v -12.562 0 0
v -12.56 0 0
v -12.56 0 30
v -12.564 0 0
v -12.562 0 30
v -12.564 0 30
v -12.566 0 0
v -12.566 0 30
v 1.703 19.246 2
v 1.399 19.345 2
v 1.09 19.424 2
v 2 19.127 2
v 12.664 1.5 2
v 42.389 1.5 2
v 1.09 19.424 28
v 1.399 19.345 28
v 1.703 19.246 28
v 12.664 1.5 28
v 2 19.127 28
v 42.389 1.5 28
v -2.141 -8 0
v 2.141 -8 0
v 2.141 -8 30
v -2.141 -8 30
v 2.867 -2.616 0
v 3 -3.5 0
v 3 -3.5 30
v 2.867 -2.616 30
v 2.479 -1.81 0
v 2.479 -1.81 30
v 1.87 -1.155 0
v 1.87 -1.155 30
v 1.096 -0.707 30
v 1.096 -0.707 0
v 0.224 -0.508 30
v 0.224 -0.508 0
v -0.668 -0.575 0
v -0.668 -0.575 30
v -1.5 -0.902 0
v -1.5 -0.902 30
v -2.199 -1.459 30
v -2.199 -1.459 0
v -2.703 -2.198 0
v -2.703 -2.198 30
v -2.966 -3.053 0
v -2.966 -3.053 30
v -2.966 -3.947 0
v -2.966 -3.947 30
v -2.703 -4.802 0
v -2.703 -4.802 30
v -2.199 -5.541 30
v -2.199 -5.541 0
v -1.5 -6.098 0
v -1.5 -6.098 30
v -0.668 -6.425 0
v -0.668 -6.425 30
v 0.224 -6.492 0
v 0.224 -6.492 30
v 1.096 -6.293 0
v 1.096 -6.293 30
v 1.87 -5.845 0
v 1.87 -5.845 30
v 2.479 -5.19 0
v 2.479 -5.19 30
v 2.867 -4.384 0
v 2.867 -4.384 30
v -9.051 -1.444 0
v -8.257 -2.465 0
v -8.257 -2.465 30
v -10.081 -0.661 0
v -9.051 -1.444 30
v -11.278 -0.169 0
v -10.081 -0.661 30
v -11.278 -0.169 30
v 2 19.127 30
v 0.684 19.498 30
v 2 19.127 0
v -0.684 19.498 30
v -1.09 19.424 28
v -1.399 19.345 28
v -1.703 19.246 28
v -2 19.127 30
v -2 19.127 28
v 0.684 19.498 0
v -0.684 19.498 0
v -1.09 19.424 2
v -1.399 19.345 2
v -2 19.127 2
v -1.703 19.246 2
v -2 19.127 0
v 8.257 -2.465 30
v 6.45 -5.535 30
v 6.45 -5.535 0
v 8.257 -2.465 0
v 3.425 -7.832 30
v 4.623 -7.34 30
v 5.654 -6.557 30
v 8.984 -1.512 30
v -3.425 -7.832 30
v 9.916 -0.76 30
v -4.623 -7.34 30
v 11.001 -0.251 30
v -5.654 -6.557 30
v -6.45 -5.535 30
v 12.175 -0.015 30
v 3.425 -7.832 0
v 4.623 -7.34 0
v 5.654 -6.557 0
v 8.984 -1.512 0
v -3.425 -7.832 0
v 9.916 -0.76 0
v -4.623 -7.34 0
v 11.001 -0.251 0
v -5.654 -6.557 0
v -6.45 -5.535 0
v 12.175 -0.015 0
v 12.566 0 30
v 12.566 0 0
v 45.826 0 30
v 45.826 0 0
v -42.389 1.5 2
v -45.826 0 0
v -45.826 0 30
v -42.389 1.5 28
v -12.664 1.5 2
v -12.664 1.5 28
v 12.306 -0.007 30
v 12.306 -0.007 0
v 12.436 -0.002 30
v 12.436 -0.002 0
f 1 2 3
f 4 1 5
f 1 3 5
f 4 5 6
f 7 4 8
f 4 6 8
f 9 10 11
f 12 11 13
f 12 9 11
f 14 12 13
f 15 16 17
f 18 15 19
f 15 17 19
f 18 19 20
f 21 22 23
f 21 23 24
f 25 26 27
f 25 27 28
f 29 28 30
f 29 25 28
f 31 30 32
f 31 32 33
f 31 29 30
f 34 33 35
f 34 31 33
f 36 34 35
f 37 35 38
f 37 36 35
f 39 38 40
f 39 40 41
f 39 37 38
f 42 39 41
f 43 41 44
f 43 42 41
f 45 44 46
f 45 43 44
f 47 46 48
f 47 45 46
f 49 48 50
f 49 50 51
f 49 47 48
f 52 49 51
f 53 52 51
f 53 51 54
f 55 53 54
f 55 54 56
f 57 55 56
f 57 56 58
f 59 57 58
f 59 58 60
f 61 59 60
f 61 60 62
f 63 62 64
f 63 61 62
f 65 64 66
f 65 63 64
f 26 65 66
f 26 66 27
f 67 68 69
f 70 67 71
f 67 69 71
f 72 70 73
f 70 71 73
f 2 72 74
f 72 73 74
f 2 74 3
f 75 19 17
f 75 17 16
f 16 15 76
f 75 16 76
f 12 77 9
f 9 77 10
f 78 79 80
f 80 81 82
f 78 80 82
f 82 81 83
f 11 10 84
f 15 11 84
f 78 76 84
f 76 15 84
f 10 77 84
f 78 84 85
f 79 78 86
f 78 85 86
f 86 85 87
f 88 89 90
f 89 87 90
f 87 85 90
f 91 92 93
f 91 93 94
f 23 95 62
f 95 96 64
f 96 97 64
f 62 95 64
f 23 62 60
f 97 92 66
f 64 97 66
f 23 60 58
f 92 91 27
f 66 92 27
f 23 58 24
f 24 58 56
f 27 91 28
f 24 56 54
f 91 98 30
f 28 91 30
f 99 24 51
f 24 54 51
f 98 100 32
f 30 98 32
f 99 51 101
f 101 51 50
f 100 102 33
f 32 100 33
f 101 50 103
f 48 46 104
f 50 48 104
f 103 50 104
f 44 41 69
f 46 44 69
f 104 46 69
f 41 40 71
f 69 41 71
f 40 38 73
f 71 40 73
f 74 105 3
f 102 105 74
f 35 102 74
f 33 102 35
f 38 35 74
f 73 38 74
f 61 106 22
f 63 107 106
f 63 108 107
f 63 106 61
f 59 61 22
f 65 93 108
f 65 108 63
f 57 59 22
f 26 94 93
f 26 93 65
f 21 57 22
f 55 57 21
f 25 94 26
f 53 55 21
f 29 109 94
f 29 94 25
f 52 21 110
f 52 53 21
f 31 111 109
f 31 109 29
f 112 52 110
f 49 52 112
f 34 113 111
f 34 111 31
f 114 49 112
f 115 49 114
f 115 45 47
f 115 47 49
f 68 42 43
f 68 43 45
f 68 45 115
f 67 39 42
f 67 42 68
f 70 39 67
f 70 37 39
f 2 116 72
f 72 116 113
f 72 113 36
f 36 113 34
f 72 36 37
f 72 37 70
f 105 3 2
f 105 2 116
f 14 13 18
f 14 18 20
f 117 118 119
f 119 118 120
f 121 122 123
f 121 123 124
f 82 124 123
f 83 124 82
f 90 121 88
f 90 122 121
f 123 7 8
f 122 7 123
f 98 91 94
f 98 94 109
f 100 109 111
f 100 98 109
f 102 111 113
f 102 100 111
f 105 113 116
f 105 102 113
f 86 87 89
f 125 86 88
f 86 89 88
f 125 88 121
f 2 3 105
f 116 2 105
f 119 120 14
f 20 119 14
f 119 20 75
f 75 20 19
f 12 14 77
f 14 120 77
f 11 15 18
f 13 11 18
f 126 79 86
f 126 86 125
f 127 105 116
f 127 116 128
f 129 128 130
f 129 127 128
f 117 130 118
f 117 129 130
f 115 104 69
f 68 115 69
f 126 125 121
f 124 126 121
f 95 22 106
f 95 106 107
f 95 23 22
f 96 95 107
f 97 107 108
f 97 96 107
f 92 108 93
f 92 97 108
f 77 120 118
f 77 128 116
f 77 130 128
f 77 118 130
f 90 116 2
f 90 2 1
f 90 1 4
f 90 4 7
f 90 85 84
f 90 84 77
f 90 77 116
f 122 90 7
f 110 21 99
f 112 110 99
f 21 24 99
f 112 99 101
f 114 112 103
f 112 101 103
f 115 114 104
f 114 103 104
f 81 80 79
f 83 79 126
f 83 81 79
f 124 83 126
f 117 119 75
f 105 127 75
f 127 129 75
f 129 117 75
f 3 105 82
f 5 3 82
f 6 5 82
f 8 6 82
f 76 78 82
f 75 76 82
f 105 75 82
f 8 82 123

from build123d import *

# Parameters (mm, degrees)
BOSS_EXTRU_1_DEPTH         = 30
ENL_V_MAT_EXTRU_1_DEPTH    = 26
CONG_1_R                   = 5
CONG_2_R                   = 5
CONG_1_OF_SYM_TRIE1_R      = 5
CONG_2_OF_SYM_TRIE1_R      = 5
CONG_3_R                   = 5
ESQUISSE7_R                = 3
ENL_V_MAT_EXTRU_2_DEPTH    = 30
SURFACE_EXTRUSION1_1_BACK  = 40
SURFACE_EXTRUSION1_1_DEPTH = 40
SURFACE_EXTRUSION1_2_BACK  = 40
SURFACE_EXTRUSION1_2_DEPTH = 40


with BuildPart() as part:
    # Esquisse1 → Boss.-Extru.1 (new body)
    with BuildSketch(Plane.XY):
        Polygon((0, -8), (5, -8), (9.70678761, 0), (45.82575695, 0), (0, 20), align=None)
    boss_extru_1 = extrude(amount=BOSS_EXTRU_1_DEPTH)

    # Esquisse3 → Enlèv. mat.-Extru.1 (cut)
    with BuildSketch(Plane.XY.offset(2)):
        Polygon((1, 19.56356422), (12.66384565, 1.5), (42.388825178, 1.5), align=None)
    enl_v_mat_extru_1 = extrude(amount=ENL_V_MAT_EXTRU_1_DEPTH, mode=Mode.SUBTRACT)

    # Congé1
    cong_1_edges = [part.edges().sort_by_distance(p)[0] for p in [
        (5, -8, 15),
    ]]
    fillet(cong_1_edges, radius=CONG_1_R)

    # Congé2
    cong_2_edges = [part.edges().sort_by_distance(p)[0] for p in [
        (9.70678761, 0, 15),
    ]]
    fillet(cong_2_edges, radius=CONG_2_R)

    # Symétrie1: Boss.-Extru.1, Enlèv. mat.-Extru.1 across plane
    add(boss_extru_1.mirror(Plane(origin=(0, 0, 0), x_dir=(0, 0, 1), z_dir=(1, 0, 0))))
    add(enl_v_mat_extru_1.mirror(Plane(origin=(0, 0, 0), x_dir=(0, 0, 1), z_dir=(1, 0, 0))), mode=Mode.SUBTRACT)

    # Congé1 of Symétrie1
    cong_1_of_sym_trie1_edges = [part.edges().sort_by_distance(p)[0] for p in [
        (-5, -8, 15),
    ]]
    fillet(cong_1_of_sym_trie1_edges, radius=CONG_1_OF_SYM_TRIE1_R)

    # Congé2 of Symétrie1
    cong_2_of_sym_trie1_edges = [part.edges().sort_by_distance(p)[0] for p in [
        (-9.70678761, 0, 15),
    ]]
    fillet(cong_2_of_sym_trie1_edges, radius=CONG_2_OF_SYM_TRIE1_R)

    # Congé3
    # the kernel refuses this fillet: 5 mm, written as the material it takes off along each edge
    with BuildSketch(Plane(origin=(0, 20, -5.455447256), x_dir=(-0.9165151389911679, -0.4000000000000003, 0), z_dir=(0, 0, 1))) as cong_3_piece_1:
        with BuildLine():
            CenterArc((CONG_3_R * 0.436435780472, CONG_3_R), CONG_3_R, 222.843643044, 47.156356956)
            Line((-CONG_3_R * 0.296776330721, CONG_3_R * 0.32), (0, 0))
            Line((0, 0), (CONG_3_R * 0.436435780472, 0))
        make_face()
    extrude(amount=40.910894512, mode=Mode.SUBTRACT)

    # Esquisse7 → Enlèv. mat.-Extru.2 (cut)
    with BuildSketch(Plane.XY):
        with Locations((0, -3.5)):
            Circle(ESQUISSE7_R)
    extrude(amount=ENL_V_MAT_EXTRU_2_DEPTH, mode=Mode.SUBTRACT)


with BuildPart() as body_2:
    # Fractionner1: the piece behind the surface
    add(part.part)
    # Surface-Extrusion1: a surface, the sketch's curves swept straight by 40 mm
    with BuildLine(Plane.XY.offset(30).offset(-SURFACE_EXTRUSION1_1_BACK), mode=Mode.PRIVATE) as surface_extrusion1_1_path:
        Line((-12.566238981, 0), (12.17539903, -0.015298993))
    surface_extrusion1_1 = Shell.extrude(surface_extrusion1_1_path.wire(), (0 * SURFACE_EXTRUSION1_1_DEPTH, 0 * SURFACE_EXTRUSION1_1_DEPTH, 1 * SURFACE_EXTRUSION1_1_DEPTH))
    split(bisect_by=surface_extrusion1_1, keep=Keep.BOTTOM)


with BuildPart() as part_1:
    add(part.part)

    # Fractionner1: split by a surface, the side it looks to stays
    # Surface-Extrusion1: a surface, the sketch's curves swept straight by 40 mm
    with BuildLine(Plane.XY.offset(30).offset(-SURFACE_EXTRUSION1_2_BACK), mode=Mode.PRIVATE) as surface_extrusion1_2_path:
        Line((-12.566238981, 0), (12.17539903, -0.015298993))
    surface_extrusion1_2 = Shell.extrude(surface_extrusion1_2_path.wire(), (0 * SURFACE_EXTRUSION1_2_DEPTH, 0 * SURFACE_EXTRUSION1_2_DEPTH, 1 * SURFACE_EXTRUSION1_2_DEPTH))
    split(bisect_by=surface_extrusion1_2, keep=Keep.TOP)


solid = Compound([body_2.part, part_1.part])
